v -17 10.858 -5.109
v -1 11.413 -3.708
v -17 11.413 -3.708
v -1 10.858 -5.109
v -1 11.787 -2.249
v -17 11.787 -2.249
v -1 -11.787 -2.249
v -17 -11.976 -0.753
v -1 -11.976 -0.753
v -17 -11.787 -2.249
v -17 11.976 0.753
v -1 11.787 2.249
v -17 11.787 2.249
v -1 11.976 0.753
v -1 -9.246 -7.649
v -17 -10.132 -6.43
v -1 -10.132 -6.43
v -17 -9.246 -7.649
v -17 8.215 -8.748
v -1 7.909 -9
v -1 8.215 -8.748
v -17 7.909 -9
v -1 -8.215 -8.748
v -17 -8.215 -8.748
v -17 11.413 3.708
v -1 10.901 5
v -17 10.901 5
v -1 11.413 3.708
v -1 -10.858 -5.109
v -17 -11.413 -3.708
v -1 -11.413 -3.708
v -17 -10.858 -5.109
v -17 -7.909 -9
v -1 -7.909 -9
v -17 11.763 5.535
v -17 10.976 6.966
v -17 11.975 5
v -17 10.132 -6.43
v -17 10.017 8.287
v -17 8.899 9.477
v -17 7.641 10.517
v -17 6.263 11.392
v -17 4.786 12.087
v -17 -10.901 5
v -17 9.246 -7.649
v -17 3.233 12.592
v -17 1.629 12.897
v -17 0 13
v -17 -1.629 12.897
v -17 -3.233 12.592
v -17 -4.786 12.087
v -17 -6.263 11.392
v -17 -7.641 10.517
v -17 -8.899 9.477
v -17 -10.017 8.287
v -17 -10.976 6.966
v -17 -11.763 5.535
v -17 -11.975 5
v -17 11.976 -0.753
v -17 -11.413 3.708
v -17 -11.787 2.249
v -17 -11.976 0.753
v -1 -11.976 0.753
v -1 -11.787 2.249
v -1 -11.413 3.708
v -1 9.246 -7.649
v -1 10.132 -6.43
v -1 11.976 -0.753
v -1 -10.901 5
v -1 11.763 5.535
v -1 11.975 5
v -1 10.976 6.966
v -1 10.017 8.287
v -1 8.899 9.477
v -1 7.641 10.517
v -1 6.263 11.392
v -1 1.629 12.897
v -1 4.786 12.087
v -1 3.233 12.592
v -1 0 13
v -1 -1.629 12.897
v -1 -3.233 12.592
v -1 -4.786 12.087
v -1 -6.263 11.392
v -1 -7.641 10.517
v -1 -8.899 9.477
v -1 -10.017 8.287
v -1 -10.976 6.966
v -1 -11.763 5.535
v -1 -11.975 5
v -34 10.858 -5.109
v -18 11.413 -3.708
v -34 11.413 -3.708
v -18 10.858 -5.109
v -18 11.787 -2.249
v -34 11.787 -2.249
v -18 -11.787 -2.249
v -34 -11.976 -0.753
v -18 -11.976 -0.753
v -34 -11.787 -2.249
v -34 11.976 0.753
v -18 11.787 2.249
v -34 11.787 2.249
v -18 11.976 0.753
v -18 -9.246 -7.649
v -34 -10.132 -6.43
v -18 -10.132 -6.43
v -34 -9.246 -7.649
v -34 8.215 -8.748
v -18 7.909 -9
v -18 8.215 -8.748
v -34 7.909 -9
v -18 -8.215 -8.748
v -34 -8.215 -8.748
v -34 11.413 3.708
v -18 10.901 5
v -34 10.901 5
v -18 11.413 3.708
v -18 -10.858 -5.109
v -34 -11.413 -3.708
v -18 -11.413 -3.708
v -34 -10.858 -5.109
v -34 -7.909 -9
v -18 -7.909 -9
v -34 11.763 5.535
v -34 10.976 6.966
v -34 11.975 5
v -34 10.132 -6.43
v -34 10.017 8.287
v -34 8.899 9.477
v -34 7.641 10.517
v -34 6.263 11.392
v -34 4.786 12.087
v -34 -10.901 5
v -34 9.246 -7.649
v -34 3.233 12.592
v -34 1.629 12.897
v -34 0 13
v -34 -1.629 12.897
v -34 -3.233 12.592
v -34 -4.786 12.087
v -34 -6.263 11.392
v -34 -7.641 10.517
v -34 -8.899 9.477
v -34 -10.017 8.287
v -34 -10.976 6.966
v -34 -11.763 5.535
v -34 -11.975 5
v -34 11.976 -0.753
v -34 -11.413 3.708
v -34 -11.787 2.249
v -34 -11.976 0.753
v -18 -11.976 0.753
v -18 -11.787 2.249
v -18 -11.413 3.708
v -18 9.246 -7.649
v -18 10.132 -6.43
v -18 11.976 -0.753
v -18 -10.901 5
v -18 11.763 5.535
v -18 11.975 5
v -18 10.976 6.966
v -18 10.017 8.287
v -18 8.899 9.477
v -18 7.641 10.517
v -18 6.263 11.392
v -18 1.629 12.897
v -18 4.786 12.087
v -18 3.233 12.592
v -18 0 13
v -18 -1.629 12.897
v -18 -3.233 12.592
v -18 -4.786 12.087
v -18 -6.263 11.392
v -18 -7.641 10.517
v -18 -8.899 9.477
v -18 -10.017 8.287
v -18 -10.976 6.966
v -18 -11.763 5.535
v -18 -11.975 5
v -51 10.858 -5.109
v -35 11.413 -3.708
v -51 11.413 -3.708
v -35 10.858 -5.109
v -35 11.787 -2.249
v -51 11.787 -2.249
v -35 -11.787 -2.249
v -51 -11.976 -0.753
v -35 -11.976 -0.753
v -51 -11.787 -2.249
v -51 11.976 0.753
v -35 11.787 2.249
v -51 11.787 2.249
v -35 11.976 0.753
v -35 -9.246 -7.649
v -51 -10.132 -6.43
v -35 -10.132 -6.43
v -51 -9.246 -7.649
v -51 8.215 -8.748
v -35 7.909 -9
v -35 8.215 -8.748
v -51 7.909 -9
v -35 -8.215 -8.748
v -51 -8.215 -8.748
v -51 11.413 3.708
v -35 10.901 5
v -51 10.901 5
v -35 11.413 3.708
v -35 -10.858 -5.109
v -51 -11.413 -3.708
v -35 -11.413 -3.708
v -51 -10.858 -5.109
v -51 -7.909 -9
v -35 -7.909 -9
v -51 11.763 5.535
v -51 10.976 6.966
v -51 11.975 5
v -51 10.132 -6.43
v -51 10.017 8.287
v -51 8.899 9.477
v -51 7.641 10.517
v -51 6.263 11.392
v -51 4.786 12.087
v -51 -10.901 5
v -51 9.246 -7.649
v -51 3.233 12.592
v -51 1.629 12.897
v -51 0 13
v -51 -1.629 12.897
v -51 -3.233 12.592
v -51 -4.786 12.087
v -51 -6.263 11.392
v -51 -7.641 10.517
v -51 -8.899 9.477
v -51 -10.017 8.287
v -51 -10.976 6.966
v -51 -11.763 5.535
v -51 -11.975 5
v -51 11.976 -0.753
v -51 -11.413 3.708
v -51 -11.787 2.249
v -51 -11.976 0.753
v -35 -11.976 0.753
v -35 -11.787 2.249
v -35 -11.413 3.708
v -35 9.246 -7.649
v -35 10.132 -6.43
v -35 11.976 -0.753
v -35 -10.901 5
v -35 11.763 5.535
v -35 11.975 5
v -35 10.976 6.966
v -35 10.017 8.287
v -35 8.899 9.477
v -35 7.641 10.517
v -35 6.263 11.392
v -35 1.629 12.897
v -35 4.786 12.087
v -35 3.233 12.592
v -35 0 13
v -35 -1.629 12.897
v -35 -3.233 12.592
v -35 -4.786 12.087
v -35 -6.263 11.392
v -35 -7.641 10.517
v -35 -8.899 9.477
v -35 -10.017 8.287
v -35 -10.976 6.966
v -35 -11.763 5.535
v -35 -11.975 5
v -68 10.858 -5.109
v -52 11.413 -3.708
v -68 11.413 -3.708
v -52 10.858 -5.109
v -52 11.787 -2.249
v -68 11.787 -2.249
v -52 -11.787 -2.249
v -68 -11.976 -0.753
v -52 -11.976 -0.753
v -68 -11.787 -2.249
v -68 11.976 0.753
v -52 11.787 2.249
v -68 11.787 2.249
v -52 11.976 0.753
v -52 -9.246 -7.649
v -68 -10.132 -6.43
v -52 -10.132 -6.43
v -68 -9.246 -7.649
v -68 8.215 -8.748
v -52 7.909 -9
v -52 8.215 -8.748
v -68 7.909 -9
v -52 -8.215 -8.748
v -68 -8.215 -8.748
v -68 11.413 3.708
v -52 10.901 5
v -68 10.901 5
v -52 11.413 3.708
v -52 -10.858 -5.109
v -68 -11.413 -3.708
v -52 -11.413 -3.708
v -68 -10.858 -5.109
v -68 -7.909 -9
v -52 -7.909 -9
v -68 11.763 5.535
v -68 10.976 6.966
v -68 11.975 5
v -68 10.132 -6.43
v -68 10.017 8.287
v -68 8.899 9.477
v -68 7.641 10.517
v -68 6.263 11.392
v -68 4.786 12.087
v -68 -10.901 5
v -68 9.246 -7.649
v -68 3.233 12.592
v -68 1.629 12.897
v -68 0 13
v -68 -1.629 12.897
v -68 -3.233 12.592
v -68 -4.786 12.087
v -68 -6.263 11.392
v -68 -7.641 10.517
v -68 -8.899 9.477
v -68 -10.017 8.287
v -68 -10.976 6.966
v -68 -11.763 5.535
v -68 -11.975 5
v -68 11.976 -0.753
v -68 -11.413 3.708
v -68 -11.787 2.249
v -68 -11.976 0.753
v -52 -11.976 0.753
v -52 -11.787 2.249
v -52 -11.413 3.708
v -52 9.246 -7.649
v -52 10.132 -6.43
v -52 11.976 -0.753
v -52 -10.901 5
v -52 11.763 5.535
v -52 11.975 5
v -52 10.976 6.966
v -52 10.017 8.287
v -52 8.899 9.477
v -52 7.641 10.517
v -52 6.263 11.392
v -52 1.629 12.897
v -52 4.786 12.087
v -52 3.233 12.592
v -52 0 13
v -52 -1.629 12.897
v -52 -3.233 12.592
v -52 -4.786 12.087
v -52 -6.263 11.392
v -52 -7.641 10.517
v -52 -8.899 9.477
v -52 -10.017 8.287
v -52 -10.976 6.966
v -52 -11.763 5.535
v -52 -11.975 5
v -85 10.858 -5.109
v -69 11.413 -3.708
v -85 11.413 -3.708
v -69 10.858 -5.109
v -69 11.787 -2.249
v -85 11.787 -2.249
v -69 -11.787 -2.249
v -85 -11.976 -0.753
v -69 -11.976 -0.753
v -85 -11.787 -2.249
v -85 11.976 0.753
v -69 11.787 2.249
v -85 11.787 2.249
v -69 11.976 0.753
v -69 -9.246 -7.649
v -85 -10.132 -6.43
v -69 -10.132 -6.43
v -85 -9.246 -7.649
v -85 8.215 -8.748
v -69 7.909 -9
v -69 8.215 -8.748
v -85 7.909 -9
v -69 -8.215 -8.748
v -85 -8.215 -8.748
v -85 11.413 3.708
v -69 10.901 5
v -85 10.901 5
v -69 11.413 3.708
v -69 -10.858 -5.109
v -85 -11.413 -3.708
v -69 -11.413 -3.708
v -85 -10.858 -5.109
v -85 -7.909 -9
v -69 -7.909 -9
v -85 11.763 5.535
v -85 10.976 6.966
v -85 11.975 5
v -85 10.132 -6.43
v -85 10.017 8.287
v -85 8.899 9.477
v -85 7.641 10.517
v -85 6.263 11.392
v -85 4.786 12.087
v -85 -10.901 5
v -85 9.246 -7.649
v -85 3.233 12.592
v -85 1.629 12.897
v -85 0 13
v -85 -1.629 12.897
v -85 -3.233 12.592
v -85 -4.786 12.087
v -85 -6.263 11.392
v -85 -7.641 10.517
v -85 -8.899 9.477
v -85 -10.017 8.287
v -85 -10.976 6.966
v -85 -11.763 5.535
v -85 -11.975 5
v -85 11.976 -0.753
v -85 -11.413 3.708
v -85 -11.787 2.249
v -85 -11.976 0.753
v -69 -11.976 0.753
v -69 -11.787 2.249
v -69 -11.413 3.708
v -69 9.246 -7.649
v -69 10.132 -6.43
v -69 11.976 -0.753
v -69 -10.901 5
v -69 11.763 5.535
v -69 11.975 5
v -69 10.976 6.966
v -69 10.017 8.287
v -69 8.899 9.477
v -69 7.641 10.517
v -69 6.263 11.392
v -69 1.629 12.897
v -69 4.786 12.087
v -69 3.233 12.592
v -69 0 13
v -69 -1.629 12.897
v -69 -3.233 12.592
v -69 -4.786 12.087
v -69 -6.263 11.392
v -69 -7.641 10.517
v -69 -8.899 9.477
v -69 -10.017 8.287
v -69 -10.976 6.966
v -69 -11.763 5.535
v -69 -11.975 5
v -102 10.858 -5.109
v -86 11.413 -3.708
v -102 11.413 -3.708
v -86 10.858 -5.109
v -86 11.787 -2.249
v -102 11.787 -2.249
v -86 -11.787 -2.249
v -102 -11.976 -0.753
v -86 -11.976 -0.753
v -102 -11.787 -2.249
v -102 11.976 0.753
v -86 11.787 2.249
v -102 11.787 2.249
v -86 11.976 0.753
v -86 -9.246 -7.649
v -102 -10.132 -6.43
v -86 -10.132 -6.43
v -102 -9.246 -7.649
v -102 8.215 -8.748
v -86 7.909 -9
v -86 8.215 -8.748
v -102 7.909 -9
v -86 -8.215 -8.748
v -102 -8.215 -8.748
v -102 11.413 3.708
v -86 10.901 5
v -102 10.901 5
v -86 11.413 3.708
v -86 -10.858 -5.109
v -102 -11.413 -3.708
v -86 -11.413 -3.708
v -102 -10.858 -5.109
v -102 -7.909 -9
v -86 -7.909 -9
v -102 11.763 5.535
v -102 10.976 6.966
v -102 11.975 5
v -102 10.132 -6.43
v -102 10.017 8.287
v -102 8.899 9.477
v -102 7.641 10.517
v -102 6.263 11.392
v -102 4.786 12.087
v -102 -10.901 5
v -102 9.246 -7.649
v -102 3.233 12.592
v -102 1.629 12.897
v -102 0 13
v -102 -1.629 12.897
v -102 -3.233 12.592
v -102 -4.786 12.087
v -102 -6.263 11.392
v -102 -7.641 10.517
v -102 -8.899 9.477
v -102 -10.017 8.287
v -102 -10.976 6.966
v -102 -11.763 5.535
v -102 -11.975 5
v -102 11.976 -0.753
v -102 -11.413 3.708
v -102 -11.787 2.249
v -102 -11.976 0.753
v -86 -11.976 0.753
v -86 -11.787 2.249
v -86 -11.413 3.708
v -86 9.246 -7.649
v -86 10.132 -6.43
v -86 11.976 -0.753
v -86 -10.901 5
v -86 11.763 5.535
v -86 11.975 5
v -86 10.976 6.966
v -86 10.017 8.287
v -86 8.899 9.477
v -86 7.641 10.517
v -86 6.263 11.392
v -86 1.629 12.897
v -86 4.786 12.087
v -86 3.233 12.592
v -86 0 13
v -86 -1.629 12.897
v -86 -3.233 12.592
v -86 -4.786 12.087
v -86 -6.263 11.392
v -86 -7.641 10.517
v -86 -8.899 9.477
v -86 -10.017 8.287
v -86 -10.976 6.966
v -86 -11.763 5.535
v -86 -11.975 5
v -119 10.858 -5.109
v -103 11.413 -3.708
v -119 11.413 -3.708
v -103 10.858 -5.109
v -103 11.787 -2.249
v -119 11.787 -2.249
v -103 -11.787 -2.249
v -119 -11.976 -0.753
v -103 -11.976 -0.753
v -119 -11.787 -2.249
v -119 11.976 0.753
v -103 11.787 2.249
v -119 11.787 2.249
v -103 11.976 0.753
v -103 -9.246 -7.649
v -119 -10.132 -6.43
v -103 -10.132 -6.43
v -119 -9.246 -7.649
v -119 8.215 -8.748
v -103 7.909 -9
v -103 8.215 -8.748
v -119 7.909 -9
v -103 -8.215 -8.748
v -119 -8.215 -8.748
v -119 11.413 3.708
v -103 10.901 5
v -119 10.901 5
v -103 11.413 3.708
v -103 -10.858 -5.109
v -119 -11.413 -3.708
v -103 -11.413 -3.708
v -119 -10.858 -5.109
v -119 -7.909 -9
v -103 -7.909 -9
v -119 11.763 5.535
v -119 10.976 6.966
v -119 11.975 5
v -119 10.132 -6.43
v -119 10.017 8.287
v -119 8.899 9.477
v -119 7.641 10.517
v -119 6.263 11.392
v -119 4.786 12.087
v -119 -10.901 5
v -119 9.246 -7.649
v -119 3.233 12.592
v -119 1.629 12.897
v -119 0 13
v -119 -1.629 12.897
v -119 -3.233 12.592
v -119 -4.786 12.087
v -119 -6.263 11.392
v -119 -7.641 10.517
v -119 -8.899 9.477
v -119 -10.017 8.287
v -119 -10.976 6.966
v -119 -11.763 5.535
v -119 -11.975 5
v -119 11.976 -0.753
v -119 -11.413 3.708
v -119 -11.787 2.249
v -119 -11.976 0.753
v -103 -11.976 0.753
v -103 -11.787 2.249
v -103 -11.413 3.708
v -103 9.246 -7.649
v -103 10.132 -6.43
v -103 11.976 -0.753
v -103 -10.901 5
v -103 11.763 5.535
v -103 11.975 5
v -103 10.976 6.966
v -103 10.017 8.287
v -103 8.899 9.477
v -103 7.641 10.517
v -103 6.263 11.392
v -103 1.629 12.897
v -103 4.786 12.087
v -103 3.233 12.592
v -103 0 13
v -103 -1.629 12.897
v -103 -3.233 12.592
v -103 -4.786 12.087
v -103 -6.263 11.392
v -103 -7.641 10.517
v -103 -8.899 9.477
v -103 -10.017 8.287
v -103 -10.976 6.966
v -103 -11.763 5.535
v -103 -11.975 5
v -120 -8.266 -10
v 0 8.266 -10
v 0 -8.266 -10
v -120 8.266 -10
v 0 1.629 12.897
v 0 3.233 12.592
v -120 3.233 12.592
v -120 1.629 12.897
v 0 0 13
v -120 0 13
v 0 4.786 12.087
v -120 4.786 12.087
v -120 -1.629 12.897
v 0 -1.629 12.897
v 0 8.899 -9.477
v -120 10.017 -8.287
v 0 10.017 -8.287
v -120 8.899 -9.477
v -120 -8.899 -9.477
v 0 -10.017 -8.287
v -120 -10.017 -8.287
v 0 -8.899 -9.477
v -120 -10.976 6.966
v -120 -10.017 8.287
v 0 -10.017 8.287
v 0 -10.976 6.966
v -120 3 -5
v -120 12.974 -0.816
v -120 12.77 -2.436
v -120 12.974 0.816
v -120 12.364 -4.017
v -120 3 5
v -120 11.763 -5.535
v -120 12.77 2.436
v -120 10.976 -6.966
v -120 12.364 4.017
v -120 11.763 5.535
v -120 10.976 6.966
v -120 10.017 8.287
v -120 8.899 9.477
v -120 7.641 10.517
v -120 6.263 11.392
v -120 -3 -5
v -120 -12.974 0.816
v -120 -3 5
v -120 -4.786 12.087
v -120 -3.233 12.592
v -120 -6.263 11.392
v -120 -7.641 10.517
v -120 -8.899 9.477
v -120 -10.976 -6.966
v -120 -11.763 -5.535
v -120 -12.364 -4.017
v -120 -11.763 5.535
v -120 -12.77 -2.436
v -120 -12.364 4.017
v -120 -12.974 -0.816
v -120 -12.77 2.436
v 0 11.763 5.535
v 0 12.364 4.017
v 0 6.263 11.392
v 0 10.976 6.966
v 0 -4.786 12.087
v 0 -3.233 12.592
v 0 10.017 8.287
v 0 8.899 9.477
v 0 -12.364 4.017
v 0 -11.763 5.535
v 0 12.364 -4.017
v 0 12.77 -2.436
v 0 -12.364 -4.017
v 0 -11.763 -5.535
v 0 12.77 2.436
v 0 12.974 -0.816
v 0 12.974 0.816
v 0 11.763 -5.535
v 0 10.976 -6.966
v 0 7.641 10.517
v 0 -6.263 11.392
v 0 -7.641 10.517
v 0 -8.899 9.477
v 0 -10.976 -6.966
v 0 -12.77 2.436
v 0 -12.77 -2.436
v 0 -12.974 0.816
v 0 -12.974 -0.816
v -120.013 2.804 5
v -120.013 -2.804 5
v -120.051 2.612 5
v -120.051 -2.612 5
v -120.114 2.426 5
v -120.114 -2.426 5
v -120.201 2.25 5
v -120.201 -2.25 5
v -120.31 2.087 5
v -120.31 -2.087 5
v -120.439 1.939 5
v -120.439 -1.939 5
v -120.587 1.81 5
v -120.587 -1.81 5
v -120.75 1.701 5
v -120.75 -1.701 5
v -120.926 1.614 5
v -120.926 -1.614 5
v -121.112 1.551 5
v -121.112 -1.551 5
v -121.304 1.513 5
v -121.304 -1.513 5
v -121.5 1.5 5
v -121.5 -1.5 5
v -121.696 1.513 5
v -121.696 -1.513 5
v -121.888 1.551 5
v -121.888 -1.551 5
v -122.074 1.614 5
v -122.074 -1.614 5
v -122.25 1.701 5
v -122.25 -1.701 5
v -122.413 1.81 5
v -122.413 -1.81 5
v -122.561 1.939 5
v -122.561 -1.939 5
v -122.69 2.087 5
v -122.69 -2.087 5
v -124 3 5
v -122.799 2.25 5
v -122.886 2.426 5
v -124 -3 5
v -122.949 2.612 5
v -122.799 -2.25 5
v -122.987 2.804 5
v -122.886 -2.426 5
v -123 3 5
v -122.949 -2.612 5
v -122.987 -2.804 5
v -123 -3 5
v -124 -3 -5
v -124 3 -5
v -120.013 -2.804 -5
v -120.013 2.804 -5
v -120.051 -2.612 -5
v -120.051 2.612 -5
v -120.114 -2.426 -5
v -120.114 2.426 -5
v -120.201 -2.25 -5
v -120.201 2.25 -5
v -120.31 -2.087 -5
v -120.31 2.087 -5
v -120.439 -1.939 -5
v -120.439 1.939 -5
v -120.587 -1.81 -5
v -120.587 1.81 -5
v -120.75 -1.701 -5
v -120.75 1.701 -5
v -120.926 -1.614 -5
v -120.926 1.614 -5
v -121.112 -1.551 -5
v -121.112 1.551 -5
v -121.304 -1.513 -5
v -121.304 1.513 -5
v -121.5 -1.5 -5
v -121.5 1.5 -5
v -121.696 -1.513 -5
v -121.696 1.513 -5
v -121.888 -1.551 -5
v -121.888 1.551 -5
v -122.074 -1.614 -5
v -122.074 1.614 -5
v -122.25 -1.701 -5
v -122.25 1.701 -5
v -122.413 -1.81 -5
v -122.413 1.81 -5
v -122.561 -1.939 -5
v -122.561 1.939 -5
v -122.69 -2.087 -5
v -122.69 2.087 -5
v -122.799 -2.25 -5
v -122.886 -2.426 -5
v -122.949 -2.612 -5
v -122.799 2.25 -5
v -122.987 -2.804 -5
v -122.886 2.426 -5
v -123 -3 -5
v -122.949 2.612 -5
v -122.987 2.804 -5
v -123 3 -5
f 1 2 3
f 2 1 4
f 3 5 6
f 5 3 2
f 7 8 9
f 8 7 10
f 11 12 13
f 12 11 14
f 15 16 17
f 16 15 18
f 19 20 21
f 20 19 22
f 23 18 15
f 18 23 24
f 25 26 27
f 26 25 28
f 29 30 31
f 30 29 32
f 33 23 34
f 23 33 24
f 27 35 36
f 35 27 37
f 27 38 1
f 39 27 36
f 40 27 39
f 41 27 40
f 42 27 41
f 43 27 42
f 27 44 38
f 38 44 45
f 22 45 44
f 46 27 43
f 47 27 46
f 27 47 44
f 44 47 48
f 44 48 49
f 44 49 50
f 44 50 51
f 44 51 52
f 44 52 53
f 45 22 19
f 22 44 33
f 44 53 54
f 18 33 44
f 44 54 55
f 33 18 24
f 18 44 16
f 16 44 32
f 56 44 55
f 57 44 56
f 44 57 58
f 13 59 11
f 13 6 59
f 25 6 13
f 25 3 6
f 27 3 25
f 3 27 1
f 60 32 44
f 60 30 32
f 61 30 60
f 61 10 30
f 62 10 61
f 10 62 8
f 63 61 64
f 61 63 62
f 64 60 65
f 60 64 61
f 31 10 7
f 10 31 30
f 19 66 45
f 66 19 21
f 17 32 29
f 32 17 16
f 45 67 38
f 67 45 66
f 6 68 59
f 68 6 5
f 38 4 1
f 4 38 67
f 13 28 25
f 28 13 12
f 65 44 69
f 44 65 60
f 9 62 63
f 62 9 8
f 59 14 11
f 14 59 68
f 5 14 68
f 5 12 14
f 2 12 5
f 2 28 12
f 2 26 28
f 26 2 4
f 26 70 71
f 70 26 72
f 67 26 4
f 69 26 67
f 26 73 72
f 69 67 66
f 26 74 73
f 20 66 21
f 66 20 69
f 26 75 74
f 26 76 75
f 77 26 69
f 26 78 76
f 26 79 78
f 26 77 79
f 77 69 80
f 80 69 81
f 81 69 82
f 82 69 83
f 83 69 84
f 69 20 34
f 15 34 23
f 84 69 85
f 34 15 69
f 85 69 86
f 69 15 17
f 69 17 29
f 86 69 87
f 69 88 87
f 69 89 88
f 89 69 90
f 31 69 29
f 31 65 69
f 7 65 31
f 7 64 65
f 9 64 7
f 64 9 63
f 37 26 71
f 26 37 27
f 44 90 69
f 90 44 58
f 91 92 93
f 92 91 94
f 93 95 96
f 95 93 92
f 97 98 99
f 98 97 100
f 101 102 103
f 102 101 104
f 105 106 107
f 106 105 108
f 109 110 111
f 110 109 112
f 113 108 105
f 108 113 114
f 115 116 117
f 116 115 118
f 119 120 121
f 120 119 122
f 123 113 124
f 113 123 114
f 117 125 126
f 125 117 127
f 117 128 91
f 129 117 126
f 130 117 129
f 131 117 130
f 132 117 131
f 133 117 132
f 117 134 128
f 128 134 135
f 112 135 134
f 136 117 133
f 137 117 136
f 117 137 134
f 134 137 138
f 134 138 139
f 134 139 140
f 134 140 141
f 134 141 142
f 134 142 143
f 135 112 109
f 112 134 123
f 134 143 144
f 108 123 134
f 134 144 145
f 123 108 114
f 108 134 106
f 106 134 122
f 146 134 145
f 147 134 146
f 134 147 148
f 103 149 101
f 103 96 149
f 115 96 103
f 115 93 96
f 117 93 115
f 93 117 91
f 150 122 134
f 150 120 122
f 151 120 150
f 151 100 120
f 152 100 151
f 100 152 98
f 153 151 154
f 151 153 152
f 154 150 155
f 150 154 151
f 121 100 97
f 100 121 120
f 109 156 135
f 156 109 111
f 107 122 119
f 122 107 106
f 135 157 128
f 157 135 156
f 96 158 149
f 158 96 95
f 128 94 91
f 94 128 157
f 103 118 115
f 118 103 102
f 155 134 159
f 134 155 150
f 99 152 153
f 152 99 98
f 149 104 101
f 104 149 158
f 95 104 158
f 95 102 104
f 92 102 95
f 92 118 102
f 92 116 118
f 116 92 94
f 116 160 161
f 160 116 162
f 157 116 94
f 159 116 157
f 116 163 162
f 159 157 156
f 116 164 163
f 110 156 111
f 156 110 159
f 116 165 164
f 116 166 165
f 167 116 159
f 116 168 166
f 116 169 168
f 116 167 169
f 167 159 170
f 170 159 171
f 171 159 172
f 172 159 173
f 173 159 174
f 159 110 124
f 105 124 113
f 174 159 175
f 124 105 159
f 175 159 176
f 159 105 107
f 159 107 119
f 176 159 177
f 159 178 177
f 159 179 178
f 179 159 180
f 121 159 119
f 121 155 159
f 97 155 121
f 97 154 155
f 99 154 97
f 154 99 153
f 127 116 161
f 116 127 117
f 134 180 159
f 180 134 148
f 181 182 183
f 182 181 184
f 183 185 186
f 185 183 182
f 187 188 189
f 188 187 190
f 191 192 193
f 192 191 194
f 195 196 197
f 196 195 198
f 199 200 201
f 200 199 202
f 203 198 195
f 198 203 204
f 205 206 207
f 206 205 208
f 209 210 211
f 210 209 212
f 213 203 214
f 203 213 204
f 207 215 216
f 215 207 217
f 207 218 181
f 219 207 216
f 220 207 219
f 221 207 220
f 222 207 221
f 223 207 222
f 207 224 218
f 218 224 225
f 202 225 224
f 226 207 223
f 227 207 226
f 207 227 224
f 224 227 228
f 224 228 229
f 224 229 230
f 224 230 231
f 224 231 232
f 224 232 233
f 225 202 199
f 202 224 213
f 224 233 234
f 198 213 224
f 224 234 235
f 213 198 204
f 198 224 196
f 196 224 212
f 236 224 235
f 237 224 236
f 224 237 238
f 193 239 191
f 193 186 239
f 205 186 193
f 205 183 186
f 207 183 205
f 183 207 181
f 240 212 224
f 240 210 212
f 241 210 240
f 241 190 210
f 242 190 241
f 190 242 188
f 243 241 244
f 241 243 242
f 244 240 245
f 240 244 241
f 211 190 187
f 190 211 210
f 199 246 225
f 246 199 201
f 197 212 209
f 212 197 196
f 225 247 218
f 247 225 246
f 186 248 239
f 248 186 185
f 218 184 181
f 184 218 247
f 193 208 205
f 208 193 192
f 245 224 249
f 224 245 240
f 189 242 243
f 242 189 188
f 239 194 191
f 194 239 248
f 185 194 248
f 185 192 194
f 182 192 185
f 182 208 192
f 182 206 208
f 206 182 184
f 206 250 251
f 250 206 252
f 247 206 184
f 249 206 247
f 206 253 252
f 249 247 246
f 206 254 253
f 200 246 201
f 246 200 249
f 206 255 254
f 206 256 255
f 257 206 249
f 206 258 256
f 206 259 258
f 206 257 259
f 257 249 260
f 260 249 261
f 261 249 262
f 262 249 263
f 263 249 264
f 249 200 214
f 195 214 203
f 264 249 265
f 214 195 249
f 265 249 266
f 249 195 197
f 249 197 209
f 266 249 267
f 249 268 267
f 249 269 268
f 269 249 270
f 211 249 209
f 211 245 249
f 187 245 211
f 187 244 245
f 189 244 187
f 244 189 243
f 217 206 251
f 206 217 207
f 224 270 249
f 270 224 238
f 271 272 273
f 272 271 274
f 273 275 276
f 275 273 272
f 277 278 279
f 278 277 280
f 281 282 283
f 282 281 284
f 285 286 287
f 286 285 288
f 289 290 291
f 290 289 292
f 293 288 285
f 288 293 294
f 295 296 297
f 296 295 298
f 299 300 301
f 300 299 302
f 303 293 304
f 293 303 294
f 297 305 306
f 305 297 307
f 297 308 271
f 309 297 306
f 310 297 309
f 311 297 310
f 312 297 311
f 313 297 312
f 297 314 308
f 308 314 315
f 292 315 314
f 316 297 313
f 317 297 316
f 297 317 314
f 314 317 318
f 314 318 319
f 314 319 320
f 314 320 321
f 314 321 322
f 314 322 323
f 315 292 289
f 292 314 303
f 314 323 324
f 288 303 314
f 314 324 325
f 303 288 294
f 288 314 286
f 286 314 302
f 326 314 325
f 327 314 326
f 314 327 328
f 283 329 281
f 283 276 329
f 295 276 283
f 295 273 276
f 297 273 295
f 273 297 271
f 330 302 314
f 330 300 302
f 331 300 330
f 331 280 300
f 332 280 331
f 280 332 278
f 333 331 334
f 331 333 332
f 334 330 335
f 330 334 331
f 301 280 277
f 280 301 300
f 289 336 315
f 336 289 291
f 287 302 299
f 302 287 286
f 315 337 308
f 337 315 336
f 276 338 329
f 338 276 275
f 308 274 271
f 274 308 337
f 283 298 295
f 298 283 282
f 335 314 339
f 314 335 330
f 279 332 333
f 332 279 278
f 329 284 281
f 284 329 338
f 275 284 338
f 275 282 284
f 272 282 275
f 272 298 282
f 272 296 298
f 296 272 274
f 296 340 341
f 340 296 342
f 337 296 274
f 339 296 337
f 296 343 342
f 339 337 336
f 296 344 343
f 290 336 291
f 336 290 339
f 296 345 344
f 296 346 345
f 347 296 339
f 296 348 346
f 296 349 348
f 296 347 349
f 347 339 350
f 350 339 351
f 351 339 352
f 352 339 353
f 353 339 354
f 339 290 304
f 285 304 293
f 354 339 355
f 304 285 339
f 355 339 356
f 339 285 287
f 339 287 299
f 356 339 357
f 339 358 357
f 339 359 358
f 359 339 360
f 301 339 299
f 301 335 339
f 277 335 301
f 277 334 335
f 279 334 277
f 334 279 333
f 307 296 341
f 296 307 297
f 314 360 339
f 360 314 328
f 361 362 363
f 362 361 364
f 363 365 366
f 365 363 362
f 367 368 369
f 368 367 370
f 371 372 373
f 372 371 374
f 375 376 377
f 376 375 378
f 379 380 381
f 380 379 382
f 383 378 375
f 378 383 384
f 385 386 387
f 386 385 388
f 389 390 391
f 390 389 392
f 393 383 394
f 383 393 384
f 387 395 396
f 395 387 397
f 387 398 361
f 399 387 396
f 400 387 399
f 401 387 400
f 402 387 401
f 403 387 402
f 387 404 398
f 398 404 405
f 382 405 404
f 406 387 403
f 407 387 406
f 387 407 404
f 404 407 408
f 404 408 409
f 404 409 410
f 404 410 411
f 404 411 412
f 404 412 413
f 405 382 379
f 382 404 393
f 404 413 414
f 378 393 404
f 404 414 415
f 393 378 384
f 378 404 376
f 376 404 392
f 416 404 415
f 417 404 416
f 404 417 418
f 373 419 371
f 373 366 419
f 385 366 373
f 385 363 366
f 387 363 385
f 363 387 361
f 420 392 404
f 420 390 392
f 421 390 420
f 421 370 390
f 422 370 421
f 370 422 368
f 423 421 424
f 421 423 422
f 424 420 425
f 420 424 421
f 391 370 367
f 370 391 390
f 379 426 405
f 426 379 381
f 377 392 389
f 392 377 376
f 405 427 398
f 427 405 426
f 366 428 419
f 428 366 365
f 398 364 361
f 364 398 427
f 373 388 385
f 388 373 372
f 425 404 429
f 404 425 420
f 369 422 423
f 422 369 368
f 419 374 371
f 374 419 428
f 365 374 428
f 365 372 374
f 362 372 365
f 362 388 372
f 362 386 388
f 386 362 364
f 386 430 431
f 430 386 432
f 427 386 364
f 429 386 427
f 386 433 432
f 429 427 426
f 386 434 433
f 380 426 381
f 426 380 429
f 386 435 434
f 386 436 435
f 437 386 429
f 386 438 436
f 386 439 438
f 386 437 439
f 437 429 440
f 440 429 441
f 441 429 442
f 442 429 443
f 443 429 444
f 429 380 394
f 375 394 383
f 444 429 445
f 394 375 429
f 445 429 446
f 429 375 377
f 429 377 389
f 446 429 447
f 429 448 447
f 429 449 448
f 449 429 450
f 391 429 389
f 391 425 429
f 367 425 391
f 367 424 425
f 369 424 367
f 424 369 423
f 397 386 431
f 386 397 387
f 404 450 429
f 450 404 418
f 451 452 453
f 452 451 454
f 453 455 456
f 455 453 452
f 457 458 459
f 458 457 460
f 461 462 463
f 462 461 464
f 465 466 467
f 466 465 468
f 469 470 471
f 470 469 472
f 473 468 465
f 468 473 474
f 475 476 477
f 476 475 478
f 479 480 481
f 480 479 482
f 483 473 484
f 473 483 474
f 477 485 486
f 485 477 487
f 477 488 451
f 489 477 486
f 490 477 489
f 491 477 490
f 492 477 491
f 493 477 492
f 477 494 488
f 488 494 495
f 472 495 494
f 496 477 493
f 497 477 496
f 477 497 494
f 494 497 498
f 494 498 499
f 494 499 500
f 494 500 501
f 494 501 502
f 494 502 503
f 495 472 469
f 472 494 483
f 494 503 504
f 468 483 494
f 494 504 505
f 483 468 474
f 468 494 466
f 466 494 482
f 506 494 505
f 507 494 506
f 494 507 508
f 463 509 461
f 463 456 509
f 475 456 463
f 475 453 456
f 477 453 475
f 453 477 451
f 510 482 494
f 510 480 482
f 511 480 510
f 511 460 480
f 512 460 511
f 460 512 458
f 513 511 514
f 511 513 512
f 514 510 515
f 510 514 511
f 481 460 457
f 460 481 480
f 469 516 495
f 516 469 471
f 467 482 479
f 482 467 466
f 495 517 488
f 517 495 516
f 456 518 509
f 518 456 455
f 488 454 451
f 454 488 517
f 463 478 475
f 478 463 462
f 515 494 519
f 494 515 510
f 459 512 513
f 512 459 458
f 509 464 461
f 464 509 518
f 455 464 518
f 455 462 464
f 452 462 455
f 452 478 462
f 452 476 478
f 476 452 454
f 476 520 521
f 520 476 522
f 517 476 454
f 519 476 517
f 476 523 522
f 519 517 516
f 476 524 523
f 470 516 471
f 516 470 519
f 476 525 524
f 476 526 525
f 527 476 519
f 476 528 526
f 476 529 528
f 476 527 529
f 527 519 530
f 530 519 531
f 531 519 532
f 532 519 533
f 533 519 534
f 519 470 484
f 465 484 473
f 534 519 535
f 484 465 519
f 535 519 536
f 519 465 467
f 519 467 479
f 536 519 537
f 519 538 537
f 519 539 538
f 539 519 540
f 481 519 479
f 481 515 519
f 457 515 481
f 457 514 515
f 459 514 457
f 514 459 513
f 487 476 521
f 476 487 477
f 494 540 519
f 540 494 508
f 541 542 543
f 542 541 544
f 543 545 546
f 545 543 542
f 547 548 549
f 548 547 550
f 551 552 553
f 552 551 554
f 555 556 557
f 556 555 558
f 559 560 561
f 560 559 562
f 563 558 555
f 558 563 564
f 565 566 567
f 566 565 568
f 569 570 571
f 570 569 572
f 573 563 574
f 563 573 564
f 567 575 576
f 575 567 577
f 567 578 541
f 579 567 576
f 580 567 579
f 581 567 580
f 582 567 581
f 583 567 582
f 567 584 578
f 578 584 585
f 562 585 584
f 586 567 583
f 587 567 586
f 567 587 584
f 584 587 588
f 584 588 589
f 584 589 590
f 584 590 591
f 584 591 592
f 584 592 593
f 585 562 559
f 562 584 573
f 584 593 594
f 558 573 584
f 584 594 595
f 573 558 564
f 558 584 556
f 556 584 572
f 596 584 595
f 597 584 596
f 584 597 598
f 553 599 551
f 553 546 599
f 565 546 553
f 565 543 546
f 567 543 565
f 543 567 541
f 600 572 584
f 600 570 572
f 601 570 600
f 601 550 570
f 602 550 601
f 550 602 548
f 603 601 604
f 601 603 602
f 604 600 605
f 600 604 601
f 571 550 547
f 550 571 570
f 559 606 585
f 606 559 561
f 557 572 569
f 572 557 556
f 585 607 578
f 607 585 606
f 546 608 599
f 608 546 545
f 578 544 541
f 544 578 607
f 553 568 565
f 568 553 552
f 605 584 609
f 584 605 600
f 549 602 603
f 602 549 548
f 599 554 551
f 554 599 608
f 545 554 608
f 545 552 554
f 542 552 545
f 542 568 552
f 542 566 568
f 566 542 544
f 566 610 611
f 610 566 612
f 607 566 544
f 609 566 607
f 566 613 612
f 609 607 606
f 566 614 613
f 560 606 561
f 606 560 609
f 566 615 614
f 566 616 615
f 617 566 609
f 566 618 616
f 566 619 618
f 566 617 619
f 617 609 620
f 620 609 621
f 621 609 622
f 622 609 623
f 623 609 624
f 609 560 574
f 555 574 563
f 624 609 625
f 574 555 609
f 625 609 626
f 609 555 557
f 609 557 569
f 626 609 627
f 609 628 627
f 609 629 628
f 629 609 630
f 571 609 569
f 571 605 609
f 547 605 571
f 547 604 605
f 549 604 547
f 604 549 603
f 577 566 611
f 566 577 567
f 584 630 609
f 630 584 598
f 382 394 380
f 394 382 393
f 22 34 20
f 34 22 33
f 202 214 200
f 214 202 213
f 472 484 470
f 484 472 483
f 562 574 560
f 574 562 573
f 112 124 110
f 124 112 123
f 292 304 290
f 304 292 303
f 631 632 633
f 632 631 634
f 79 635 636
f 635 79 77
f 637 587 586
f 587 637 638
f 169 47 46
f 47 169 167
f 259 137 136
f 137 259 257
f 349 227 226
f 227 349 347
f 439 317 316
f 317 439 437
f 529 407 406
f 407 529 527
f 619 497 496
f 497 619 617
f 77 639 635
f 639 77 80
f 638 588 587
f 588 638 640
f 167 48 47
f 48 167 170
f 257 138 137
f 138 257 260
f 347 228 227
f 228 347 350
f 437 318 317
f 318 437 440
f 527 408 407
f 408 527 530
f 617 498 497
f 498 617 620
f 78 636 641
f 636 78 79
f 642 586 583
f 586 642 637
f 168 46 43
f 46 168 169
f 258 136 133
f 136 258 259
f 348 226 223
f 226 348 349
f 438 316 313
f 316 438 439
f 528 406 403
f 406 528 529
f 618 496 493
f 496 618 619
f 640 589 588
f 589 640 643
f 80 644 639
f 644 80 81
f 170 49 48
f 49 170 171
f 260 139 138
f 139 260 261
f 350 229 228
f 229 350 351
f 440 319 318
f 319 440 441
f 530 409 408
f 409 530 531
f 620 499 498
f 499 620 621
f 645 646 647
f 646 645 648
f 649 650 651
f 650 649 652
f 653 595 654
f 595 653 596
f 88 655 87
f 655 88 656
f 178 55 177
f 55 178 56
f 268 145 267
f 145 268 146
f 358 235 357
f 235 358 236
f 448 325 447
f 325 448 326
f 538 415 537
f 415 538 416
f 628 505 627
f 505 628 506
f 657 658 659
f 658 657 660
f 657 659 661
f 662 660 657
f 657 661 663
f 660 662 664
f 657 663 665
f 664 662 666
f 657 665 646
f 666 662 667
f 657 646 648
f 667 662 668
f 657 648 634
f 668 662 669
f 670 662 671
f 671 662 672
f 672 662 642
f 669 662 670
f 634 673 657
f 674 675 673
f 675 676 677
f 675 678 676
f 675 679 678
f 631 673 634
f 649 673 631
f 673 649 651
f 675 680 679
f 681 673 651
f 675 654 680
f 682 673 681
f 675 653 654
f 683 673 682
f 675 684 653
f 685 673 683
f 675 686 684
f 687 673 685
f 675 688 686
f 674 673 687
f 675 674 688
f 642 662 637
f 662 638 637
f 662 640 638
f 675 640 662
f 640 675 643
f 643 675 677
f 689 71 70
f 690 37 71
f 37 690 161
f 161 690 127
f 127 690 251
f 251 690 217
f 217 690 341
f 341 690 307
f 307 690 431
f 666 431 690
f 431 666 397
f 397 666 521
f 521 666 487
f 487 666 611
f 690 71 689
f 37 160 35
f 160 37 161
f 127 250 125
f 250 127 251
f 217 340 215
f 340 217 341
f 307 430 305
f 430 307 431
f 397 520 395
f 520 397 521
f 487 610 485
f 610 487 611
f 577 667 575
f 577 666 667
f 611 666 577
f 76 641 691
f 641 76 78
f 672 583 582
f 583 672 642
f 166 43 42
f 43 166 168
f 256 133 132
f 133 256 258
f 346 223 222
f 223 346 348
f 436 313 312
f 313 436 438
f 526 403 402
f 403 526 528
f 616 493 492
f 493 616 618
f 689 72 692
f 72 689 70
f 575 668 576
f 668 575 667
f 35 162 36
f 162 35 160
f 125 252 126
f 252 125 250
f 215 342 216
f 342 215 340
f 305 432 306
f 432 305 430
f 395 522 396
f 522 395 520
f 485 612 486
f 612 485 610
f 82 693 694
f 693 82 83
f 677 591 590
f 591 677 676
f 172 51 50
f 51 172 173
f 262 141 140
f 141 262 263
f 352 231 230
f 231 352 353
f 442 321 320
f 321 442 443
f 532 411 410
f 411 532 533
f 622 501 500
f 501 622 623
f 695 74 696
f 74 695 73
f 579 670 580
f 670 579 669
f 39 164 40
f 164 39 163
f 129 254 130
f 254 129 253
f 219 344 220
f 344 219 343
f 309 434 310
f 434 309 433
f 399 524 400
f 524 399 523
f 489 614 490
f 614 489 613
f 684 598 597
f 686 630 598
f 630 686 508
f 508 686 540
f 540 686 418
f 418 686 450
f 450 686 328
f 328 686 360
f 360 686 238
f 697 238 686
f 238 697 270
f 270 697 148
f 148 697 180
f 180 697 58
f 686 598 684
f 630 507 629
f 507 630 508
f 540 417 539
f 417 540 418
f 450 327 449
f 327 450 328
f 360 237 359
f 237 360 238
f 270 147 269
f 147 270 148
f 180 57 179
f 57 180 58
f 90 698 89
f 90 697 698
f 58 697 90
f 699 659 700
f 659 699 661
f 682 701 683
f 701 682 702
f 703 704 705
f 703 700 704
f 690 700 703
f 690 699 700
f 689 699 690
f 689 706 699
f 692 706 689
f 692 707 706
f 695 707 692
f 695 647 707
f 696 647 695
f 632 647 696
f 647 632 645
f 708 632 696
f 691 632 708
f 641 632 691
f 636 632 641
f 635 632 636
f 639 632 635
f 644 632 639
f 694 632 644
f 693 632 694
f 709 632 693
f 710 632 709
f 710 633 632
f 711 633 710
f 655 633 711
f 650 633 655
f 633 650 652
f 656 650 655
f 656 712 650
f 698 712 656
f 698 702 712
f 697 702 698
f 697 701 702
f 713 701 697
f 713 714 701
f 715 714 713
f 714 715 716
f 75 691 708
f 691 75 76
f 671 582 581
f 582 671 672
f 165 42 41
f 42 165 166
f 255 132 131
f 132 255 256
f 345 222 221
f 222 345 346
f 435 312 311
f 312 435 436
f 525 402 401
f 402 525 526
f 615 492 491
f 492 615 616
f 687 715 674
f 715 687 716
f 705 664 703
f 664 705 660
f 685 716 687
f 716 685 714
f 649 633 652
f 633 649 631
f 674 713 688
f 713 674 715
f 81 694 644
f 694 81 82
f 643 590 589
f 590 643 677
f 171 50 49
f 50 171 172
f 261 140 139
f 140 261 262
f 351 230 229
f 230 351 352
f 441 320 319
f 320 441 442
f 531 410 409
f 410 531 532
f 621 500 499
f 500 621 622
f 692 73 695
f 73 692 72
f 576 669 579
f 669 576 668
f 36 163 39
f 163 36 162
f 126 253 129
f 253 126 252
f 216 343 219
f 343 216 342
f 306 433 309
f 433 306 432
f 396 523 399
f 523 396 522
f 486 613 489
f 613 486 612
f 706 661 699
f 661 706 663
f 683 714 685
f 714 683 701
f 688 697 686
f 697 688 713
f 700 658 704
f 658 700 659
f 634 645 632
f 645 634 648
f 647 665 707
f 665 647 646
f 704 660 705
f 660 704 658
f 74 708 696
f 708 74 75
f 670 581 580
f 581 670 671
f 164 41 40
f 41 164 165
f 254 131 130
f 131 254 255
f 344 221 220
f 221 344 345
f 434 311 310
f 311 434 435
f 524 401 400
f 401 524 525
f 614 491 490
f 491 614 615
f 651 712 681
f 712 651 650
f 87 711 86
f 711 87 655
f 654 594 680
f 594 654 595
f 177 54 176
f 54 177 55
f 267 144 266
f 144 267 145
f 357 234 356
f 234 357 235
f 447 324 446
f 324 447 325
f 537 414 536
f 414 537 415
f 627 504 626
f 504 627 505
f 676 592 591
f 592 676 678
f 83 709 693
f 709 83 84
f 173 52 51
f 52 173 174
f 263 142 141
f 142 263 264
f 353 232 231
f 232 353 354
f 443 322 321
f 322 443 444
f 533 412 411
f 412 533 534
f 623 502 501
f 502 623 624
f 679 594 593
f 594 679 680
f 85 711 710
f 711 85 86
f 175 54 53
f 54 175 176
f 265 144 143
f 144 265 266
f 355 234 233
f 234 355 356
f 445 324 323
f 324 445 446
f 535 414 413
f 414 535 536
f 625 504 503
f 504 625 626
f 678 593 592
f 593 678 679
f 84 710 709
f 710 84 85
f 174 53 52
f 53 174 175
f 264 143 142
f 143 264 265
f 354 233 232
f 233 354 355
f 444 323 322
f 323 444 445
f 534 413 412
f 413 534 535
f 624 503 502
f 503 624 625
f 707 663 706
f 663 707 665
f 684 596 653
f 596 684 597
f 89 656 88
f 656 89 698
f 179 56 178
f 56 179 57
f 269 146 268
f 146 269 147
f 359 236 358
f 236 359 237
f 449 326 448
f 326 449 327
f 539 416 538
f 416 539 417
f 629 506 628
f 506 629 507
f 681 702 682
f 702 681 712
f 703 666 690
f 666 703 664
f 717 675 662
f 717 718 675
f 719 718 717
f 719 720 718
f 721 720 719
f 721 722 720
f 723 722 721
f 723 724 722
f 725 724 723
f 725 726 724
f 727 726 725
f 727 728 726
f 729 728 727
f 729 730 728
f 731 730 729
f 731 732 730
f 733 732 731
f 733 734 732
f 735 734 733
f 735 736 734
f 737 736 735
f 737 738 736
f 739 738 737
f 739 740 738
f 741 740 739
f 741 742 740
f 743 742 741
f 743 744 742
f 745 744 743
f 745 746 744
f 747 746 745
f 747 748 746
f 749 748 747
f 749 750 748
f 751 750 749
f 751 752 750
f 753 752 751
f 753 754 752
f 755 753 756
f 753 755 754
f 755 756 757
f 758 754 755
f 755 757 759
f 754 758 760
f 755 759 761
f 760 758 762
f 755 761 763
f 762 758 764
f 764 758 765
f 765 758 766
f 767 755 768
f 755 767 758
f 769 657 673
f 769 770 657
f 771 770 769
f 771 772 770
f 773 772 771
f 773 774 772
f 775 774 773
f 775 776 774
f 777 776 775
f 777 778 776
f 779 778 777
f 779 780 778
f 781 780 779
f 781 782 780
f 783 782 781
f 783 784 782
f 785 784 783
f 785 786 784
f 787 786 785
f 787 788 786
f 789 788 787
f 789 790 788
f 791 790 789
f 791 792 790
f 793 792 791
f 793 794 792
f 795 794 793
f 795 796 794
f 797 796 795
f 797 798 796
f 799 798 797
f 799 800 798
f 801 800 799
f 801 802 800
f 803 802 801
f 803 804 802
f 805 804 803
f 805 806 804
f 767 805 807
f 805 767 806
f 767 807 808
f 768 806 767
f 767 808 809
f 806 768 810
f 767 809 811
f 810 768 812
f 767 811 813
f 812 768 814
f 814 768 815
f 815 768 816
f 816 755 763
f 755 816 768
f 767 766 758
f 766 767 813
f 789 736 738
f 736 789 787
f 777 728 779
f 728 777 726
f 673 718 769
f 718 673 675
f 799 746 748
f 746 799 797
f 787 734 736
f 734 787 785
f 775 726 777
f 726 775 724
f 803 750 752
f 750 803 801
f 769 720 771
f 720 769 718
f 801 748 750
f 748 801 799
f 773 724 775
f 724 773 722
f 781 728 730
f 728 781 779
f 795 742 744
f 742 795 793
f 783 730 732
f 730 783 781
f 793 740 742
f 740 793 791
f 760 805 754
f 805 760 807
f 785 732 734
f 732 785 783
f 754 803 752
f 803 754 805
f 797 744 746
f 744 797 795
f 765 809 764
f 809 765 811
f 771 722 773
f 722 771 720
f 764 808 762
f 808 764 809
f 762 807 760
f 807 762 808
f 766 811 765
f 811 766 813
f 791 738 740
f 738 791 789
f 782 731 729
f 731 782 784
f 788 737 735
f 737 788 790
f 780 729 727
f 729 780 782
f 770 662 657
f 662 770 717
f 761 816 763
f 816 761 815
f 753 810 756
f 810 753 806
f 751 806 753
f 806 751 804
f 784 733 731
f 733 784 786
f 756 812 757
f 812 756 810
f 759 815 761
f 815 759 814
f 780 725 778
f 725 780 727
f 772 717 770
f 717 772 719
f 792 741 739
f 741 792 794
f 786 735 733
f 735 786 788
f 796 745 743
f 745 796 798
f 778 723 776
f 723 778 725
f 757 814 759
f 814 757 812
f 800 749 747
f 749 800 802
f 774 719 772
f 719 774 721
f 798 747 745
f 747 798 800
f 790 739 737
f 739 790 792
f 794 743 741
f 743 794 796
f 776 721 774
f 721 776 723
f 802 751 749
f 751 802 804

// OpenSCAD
// 104 x 24mm max

// length of slide (minus handle, 4mm)
h=120;

// width of slide (diameter)
w=26;

// number of buckets
c=7;

// thickness of walls
t=1;

// text
txt="MTWTFSS"; // ["MTWTFSS","SMTWTFS","12345...","...54321","none"]

// text size
txtsz=7;

// font
txtfont="Droid Sans";

hs=(h-t)/c-t;

module box(pos,size) { translate(pos) cube(size); }

module write(pos=[0,0,0],rot=[0,0,0],size=3,h=1.5,text="?",halign="center",valign="center")
{
   //translate(pos)
      //rotate(rot)
      //linear_extrude(height=h)
      //text(text,size=size,halign=halign,valign=valign,font=txtfont);
}

module cyl_x(base=[0,0,0],h=10,r=5)
{
   translate(base)
      rotate([0,90,0])
      cylinder(h=h,r=r);
}


module thetext()
{
   if (txt=="MTWTFSS")
   {
      write([-10+t-0.4,0,(hs+t)*7-hs/2],rot=[90,90,90],size=txtsz,text="M");
      write([-10+t-0.4,0,(hs+t)*6-hs/2],rot=[90,90,90],size=txtsz,text="T");
      write([-10+t-0.4,0,(hs+t)*5-hs/2],rot=[90,90,90],size=txtsz,text="W");
      write([-10+t-0.4,0,(hs+t)*4-hs/2],rot=[90,90,90],size=txtsz,text="T");
      write([-10+t-0.4,0,(hs+t)*3-hs/2],rot=[90,90,90],size=txtsz,text="F");
      write([-10+t-0.4,0,(hs+t)*2-hs/2],rot=[90,90,90],size=txtsz,text="S");
      write([-10+t-0.4,0,(hs+t)*1-hs/2],rot=[90,90,90],size=txtsz,text="S");
   }
   else if (txt=="SMTWTFS")
   {
      write([-10+t-0.4,0,(hs+t)*7-hs/2],rot=[90,90,90],size=txtsz,text="S");
      write([-10+t-0.4,0,(hs+t)*6-hs/2],rot=[90,90,90],size=txtsz,text="M");
      write([-10+t-0.4,0,(hs+t)*5-hs/2],rot=[90,90,90],size=txtsz,text="T");
      write([-10+t-0.4,0,(hs+t)*4-hs/2],rot=[90,90,90],size=txtsz,text="W");
      write([-10+t-0.4,0,(hs+t)*3-hs/2],rot=[90,90,90],size=txtsz,text="T");
      write([-10+t-0.4,0,(hs+t)*2-hs/2],rot=[90,90,90],size=txtsz,text="F");
      write([-10+t-0.4,0,(hs+t)*1-hs/2],rot=[90,90,90],size=txtsz,text="S");
   }
   else if (txt=="12345...")
   {
      for (i=[1:1:c])
         write([-10+t-0.4,0,(hs+t)*(c-i+1)-hs/2],rot=[90,90,90],size=txtsz,text=str(i));
   }
   else if (txt=="...54321")
   {
      for (i=[1:1:c])
         write([-10+t-0.4,0,(hs+t)*(i)-hs/2],rot=[90,90,90],size=txtsz,text=str(i));
   }
   
}

rotate([0,-90,0])
union()
{

difference()
{
   cylinder(h=h,r=w/2,$fn=50);
   box([-30,-50,-1],[20,100,h+2]);
   difference()
   {
      union()
      {
         for (n=[0:1:c-1])
         {
            translate([0,0,t+n*(hs+t)])
               union()
            {
               cylinder(h=hs,r=w/2-t,$fn=50);
               box([5,-50,0],[50,100,hs]);
            }
            
         }
      }
      box([-10,-50,-1],[t,100,h+2]);
   }

   thetext();
   
}

if (1)
difference()
{
   box([-5,-3,h],[10,6,4]);
   cyl_x([-11,-3,h+1.5],h=22,r=1.5,$fn=48);
   cyl_x([-11,3,h+1.5],h=22,r=1.5,$fn=48);
   
}

}
